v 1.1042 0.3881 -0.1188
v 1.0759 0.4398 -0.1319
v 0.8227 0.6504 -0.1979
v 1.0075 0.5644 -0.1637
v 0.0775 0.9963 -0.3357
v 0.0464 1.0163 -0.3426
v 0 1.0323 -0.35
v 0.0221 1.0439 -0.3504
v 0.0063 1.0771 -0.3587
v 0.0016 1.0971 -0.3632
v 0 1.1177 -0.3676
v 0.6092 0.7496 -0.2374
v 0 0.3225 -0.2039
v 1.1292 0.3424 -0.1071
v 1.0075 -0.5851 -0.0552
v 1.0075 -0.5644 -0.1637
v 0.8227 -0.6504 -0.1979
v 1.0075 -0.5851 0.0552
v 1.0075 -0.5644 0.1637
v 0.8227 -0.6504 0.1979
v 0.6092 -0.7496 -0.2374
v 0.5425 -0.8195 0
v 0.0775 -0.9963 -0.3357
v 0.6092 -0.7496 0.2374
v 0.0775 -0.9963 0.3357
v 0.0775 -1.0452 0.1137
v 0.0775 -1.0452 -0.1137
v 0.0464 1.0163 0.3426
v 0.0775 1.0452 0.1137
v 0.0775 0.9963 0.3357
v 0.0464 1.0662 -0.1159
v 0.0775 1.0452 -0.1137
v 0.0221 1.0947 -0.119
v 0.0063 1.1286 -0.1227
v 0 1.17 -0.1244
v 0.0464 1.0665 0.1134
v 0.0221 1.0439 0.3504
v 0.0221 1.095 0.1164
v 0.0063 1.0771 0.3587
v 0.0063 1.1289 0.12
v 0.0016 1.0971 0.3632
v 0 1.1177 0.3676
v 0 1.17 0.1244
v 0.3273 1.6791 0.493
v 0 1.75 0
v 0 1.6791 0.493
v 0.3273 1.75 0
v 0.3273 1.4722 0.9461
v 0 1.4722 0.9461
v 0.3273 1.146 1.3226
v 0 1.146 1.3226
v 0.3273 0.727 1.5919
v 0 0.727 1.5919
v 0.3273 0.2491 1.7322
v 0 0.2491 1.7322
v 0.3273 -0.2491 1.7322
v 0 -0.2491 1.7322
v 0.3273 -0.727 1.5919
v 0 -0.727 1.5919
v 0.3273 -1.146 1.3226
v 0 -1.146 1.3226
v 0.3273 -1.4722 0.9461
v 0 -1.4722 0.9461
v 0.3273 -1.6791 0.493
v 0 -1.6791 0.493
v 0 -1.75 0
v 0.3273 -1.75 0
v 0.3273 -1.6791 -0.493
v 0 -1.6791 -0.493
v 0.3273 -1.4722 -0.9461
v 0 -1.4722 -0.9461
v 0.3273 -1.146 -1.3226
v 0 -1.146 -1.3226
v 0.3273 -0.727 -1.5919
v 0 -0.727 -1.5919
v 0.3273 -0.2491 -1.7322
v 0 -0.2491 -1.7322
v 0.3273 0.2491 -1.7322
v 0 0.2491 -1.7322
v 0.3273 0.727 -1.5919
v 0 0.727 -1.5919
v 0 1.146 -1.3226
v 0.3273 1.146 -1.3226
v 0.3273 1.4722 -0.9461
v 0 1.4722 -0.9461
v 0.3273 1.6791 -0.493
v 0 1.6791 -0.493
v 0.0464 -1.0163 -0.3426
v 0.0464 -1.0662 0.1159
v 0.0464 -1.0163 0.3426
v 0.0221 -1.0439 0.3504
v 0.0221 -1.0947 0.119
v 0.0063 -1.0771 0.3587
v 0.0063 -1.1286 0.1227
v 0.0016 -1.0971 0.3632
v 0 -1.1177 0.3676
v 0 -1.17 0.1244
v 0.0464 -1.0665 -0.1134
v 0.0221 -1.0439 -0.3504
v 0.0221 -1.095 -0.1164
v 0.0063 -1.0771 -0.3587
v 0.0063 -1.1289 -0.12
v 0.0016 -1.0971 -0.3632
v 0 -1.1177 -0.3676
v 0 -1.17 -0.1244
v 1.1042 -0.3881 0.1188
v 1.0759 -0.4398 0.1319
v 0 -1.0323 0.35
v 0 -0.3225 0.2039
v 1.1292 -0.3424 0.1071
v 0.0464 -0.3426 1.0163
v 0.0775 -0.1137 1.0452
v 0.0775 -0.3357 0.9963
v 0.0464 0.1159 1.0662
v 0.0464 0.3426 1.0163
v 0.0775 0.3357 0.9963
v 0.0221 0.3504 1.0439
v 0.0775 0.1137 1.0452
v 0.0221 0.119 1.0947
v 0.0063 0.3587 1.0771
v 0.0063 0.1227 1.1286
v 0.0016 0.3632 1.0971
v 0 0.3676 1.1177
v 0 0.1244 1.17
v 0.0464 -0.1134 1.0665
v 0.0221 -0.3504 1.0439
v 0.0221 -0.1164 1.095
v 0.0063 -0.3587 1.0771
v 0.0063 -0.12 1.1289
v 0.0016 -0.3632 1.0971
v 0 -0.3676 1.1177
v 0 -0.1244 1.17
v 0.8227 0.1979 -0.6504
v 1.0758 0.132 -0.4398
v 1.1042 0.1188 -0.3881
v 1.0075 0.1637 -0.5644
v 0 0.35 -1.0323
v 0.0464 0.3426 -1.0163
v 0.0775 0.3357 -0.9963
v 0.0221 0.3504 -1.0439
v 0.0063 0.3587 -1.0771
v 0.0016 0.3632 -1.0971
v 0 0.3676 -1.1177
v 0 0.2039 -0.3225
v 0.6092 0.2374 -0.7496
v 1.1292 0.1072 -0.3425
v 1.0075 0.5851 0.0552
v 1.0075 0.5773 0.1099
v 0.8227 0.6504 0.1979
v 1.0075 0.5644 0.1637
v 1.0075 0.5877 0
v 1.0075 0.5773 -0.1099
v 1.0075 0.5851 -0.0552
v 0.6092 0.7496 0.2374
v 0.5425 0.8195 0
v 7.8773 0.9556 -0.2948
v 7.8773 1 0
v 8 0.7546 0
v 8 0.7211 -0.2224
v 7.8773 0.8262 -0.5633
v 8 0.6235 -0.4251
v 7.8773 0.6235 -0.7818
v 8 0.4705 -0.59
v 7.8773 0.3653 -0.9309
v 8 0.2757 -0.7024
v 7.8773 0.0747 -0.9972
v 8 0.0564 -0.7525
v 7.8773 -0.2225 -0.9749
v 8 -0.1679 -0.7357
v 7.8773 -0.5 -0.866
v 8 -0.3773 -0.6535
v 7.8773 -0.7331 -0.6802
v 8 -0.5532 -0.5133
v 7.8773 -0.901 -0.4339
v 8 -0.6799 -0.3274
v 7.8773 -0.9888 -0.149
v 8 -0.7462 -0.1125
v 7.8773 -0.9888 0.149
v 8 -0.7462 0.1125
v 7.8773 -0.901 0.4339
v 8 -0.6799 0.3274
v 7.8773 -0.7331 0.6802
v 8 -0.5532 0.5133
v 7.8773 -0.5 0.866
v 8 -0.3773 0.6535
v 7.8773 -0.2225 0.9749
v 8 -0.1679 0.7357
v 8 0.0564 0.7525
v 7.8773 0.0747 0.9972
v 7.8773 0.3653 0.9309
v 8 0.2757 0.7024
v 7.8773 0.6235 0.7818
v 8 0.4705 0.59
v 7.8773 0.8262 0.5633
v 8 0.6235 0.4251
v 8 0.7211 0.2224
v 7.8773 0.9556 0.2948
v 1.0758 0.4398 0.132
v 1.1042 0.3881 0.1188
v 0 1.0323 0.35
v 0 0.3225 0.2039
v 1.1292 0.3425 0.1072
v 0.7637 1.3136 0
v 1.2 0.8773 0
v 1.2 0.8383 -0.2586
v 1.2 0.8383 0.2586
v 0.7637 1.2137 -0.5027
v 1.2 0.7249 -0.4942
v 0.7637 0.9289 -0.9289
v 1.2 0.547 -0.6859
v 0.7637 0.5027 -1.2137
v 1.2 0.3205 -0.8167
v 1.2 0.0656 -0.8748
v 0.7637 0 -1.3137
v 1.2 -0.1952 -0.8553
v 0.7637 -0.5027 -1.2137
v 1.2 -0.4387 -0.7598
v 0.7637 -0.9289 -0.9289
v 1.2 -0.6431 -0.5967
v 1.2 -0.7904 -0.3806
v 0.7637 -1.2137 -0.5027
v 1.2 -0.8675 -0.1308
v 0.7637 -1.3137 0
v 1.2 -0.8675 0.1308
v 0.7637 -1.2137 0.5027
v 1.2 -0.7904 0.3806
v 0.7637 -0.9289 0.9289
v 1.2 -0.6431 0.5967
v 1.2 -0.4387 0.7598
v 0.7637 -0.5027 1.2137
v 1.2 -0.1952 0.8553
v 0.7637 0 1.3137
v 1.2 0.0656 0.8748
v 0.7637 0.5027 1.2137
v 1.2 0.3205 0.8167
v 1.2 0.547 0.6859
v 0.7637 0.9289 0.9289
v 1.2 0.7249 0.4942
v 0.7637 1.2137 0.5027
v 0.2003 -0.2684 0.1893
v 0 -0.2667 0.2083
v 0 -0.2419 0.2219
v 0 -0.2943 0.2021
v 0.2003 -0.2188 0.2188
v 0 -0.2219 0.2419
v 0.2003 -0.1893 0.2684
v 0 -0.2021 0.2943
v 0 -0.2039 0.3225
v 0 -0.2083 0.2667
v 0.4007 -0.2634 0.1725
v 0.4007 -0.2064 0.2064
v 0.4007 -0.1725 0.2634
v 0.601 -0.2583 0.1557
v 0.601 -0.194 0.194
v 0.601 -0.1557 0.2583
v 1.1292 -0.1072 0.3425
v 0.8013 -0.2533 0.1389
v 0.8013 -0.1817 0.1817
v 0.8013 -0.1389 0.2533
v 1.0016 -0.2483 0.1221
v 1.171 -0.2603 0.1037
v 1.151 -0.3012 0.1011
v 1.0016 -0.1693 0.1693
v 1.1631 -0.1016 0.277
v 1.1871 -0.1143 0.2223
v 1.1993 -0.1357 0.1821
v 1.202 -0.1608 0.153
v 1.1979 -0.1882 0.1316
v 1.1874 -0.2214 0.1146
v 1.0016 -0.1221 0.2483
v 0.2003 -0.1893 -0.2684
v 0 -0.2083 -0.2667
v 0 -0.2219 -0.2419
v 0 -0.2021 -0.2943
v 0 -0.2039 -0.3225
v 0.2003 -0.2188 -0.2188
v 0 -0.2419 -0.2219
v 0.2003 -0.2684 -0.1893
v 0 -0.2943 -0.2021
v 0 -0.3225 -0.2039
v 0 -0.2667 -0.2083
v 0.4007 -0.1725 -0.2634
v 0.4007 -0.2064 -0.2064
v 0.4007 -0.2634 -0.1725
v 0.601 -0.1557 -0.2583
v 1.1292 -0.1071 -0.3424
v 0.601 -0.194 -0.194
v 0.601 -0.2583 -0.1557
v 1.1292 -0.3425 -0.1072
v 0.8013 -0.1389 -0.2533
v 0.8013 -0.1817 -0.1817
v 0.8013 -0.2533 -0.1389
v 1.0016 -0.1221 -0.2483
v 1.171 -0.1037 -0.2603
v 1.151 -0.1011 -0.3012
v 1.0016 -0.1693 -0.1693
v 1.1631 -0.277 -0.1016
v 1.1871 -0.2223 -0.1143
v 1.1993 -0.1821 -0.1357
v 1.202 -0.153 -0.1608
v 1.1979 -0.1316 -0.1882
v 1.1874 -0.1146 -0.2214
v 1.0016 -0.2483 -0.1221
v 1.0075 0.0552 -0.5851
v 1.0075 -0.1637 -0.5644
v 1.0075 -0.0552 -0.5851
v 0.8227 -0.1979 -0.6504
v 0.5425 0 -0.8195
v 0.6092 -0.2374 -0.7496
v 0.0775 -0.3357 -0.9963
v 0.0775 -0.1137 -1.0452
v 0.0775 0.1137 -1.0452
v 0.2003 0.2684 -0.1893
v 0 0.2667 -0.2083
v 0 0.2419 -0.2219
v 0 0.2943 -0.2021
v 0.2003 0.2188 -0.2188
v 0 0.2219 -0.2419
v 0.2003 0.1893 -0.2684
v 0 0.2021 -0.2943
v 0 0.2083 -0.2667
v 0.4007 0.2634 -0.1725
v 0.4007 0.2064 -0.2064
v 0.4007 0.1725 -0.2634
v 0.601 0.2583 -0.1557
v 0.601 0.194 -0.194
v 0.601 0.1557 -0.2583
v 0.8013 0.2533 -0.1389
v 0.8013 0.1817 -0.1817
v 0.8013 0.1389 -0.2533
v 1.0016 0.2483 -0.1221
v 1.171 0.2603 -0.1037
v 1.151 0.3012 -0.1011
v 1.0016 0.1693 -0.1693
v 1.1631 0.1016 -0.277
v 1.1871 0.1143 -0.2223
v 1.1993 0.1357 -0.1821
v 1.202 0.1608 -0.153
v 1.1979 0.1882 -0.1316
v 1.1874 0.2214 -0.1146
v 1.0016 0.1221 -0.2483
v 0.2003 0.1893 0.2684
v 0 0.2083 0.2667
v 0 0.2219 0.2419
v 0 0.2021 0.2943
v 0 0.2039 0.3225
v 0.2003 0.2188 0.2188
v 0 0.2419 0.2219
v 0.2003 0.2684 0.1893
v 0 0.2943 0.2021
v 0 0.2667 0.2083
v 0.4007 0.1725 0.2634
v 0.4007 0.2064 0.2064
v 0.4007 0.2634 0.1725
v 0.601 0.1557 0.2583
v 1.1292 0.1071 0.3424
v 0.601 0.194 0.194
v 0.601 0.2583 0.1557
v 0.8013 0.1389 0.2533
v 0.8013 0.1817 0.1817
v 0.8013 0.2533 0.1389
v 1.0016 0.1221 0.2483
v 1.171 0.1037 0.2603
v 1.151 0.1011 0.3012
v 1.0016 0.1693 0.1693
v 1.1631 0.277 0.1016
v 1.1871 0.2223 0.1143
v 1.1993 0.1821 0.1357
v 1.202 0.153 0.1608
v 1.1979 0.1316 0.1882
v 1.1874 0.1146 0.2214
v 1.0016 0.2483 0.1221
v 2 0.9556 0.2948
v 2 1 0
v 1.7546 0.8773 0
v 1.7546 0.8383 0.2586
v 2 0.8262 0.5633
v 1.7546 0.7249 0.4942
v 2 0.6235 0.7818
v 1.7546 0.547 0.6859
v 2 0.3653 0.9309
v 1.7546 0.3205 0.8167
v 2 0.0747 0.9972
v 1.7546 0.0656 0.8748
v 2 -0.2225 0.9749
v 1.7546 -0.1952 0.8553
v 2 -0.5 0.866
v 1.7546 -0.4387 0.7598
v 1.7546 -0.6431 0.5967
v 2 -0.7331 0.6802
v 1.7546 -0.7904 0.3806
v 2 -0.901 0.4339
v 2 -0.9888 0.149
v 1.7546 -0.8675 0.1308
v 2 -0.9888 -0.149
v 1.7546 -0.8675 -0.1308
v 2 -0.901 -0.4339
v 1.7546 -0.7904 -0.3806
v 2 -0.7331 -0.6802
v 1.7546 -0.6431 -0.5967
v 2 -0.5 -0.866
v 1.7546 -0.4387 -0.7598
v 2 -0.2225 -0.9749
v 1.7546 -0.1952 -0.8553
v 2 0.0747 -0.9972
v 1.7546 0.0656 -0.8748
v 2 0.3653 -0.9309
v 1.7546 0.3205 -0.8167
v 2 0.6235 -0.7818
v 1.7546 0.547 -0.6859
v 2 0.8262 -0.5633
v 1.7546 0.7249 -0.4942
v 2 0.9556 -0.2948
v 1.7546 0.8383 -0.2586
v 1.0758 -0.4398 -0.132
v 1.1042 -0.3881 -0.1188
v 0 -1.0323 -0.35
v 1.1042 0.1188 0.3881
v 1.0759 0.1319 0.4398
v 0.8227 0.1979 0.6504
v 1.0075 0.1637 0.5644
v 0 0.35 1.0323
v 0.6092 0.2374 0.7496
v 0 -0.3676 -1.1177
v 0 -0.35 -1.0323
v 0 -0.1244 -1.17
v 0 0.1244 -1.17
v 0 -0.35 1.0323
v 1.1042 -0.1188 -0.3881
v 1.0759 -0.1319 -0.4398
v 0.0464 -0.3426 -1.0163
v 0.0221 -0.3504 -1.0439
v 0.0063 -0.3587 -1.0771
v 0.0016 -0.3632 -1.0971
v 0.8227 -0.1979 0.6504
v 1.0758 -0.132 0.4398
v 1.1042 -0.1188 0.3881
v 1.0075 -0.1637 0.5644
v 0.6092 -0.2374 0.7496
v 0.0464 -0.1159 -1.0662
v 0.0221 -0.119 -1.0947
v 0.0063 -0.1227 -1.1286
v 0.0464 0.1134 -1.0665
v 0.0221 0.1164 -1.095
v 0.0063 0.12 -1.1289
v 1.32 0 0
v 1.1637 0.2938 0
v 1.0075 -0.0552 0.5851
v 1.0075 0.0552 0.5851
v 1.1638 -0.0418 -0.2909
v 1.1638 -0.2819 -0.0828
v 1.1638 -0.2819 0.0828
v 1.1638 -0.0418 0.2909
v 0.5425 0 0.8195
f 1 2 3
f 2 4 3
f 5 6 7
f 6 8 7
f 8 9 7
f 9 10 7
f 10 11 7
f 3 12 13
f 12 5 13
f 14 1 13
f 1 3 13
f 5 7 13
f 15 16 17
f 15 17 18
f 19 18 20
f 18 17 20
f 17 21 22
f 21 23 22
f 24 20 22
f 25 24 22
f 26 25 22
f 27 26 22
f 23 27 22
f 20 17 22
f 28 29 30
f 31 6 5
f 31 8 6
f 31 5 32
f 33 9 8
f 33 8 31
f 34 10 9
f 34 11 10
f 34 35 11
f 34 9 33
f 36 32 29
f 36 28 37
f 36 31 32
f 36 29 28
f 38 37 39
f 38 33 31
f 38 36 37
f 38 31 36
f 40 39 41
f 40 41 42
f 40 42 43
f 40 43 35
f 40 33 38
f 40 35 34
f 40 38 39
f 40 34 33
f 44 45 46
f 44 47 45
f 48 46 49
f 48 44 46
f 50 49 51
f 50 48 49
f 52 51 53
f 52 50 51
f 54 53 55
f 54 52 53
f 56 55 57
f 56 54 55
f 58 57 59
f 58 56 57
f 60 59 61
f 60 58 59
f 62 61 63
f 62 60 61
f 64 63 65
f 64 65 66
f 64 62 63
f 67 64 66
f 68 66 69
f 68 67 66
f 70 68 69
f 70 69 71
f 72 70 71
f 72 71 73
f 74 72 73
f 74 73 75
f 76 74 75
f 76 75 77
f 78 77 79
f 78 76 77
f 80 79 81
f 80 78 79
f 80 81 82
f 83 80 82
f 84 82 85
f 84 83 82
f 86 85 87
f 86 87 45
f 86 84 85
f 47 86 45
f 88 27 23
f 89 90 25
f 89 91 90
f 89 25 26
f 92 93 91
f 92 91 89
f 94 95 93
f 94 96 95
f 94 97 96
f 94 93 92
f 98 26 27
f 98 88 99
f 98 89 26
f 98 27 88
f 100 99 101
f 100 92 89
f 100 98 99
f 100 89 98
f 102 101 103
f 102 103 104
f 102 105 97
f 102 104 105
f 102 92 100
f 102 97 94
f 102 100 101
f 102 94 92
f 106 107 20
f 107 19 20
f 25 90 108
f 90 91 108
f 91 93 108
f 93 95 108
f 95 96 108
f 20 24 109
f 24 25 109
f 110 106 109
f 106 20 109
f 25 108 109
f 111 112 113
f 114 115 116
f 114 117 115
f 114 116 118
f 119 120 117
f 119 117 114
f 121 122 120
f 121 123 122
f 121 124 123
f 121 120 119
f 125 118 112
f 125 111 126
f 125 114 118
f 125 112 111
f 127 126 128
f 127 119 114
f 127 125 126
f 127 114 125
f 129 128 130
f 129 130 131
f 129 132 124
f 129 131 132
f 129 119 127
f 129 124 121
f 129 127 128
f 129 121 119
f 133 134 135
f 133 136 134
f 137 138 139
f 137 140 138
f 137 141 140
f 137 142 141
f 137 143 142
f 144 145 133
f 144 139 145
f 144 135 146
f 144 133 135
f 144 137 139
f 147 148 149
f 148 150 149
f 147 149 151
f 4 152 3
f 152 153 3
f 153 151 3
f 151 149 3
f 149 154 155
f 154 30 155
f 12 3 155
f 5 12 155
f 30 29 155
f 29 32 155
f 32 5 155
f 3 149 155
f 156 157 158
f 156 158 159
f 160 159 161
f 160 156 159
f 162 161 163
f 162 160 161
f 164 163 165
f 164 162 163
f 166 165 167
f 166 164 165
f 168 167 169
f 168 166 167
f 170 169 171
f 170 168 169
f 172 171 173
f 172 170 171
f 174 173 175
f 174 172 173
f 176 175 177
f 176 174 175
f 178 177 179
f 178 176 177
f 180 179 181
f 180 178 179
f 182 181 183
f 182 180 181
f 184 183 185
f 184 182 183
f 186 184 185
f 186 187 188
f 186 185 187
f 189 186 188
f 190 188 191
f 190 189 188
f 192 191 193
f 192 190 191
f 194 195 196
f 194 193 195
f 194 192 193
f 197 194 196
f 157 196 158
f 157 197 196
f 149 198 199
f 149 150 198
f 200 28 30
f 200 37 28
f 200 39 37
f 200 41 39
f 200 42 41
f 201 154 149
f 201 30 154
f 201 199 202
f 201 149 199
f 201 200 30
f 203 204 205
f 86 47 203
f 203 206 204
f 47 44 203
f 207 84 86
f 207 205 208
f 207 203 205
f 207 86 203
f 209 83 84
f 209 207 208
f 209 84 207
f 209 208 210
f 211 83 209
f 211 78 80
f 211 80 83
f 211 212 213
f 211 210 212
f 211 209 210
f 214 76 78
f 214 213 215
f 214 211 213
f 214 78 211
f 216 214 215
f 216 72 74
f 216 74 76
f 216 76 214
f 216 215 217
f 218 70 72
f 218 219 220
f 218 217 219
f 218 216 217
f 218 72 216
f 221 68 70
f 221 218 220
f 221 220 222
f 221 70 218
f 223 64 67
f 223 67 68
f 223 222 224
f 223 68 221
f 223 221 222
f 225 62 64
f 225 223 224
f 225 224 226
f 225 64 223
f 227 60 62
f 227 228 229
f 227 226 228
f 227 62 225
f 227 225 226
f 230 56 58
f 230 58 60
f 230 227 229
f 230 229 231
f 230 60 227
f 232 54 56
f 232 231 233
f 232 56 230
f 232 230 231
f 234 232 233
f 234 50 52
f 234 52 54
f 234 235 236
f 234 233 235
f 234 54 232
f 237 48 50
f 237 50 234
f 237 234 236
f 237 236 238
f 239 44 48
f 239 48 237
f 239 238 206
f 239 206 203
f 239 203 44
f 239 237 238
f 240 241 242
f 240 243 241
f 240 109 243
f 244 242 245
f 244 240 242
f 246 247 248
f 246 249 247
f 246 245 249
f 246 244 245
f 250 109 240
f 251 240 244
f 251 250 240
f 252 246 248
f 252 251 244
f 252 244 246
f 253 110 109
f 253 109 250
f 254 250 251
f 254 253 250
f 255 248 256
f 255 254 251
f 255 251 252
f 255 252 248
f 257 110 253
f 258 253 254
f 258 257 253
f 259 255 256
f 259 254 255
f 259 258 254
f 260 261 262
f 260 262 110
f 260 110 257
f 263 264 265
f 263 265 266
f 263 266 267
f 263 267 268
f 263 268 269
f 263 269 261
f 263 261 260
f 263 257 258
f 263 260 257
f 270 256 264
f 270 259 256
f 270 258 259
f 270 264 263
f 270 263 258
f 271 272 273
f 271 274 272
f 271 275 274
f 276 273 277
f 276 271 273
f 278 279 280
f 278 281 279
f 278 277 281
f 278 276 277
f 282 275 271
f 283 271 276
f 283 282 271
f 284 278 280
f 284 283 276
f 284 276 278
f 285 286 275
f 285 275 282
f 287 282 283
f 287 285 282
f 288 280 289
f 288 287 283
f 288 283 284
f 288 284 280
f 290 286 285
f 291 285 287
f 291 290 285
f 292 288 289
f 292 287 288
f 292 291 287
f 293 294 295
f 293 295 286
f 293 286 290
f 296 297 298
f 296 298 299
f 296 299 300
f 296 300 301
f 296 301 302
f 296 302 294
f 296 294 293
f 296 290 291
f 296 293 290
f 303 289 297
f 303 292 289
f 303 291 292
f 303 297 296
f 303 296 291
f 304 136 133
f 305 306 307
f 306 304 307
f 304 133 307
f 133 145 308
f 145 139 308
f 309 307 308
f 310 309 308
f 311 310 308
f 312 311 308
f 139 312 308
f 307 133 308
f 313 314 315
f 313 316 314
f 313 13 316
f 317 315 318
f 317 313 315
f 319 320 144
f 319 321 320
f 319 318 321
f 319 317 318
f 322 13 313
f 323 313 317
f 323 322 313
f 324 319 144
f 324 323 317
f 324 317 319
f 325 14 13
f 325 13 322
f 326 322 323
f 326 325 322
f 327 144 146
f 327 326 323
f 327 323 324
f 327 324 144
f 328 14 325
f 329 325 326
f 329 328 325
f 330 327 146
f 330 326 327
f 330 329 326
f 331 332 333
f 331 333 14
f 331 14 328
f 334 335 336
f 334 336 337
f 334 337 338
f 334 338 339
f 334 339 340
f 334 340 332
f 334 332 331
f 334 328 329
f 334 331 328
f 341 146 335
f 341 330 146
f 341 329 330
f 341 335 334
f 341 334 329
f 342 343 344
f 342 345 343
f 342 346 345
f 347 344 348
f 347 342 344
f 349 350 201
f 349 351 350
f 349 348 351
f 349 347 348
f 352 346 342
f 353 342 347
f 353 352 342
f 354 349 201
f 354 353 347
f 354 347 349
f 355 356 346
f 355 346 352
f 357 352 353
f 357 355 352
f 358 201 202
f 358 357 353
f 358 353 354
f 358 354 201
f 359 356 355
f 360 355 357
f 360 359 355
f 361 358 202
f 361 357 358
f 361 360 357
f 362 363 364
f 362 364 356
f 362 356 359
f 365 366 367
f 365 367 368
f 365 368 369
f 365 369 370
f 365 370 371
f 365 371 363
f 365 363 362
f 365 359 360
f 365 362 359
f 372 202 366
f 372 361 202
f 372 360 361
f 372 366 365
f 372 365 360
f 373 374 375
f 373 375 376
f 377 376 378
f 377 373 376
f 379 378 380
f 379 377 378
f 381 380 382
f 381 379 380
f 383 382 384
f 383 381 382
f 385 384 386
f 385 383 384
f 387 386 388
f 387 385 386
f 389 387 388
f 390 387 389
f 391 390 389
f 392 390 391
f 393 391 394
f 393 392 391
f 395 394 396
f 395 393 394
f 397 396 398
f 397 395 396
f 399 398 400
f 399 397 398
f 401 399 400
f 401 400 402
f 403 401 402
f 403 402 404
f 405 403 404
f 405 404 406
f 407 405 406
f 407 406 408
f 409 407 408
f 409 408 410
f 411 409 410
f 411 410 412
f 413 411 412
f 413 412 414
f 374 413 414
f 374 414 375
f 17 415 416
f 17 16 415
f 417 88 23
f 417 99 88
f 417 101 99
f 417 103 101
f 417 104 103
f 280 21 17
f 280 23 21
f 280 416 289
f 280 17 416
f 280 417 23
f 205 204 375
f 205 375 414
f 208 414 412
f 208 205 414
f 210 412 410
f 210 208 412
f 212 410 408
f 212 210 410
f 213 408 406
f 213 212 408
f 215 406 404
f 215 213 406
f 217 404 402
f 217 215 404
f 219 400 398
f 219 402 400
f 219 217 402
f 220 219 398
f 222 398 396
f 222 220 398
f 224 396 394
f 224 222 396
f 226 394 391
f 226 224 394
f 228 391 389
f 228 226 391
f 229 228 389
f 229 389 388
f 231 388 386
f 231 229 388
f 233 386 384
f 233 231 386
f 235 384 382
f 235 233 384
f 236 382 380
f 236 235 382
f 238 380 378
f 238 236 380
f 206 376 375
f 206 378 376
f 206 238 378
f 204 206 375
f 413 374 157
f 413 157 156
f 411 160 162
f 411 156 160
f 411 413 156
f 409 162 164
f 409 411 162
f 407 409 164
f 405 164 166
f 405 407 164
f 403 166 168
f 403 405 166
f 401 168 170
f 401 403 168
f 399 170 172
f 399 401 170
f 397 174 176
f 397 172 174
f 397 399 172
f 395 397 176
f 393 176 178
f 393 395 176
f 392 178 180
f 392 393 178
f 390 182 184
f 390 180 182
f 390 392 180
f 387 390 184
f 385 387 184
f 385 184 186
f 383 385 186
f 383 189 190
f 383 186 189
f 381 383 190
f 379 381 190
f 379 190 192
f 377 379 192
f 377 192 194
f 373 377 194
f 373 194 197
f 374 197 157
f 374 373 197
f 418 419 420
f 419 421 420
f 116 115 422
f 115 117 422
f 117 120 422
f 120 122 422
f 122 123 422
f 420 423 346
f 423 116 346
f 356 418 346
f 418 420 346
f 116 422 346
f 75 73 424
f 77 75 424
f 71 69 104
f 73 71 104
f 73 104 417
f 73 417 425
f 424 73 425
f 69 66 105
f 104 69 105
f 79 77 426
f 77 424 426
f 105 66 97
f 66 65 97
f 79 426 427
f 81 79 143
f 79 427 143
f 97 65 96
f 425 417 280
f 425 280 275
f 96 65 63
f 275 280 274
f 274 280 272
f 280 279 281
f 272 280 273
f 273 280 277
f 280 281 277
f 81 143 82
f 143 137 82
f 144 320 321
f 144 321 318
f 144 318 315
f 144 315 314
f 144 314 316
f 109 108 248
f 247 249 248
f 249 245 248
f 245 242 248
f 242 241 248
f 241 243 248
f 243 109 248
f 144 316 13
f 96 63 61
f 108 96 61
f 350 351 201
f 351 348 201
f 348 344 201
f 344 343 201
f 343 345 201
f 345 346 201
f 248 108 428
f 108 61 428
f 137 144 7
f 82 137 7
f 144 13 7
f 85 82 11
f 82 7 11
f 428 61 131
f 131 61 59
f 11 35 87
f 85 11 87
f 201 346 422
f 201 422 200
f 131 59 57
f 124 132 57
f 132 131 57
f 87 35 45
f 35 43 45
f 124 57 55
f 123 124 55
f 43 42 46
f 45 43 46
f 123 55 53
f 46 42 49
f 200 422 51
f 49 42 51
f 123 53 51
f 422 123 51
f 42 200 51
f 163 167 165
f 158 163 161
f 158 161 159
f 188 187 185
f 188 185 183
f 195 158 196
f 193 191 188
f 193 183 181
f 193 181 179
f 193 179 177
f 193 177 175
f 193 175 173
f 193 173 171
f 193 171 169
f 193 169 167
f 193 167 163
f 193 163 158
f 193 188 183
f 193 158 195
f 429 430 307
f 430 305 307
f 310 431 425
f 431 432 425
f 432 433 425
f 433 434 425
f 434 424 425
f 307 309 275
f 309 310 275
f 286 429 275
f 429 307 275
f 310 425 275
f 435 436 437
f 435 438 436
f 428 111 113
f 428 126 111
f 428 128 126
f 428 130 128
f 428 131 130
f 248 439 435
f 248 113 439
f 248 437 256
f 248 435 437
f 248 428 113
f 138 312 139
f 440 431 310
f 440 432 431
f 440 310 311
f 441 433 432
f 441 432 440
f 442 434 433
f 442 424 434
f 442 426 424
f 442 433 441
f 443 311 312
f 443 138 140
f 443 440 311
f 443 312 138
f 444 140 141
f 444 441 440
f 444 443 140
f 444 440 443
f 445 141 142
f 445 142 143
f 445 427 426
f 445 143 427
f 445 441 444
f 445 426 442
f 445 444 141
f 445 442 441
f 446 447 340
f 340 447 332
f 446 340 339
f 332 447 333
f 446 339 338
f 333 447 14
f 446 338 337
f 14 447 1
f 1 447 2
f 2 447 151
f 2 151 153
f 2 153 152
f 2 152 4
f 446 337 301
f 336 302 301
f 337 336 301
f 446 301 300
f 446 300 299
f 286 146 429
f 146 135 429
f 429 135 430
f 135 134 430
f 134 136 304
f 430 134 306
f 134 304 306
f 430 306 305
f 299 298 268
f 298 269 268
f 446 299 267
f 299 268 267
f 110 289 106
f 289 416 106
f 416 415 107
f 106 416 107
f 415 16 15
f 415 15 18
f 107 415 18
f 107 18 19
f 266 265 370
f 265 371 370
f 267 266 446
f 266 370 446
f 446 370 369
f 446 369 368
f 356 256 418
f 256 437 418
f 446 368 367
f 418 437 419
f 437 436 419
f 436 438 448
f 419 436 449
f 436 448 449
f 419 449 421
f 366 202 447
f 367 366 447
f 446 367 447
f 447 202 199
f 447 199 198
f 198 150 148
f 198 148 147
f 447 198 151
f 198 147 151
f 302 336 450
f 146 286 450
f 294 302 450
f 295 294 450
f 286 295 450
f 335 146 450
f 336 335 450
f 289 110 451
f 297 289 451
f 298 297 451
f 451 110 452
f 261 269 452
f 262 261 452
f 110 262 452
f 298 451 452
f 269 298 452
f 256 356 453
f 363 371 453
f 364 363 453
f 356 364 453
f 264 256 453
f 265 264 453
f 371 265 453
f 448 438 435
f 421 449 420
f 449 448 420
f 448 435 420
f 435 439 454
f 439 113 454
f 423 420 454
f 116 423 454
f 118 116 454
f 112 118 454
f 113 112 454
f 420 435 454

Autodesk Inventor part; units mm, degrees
ref_plane "YZ Plane" through (0, 0, 0) normal (1, 0, 0) x (0, 1, 0)
ref_plane "XZ Plane" through (0, 0, 0) normal (0, 1, 0) x (-1, 0, 0)
sketch "Sketch1" plane through (0, 0, 0) normal (0, 0, 1) x (1, 0, 0)
  line L0 (1.32, 0) -> (8, 0)
  line L1 (8, 0) -> (8, 1)
  line L2 (8, 1) -> (2, 1)
  line L3 (2, 1) -> (1.7546, 0.8773)
  line L4 (1.7546, 0.8773) -> (1.2, 0.8773)
  line L5 (0, 1.75) -> (0, 1.09)
  line L6 (0, 1.09) -> (1.0075, 0.5877)
  line L7 (1.0075, 0.5877) -> (1.32, 0)
  line L8 (-1.6, 0) -> (9.6, 0) projected
  line L9 (0, -0.35) -> (0, 2.1) projected
  line L10 (0, 1.75) -> (0.3273, 1.75)
  line L11 (0.3273, 1.75) -> (1.2, 0.8773)
  line L12 (2, 1) -> (1.0773, 1) construction
  dimension "d1" = 6
  dimension "d2" = 2
  dimension "d3" = 1.7546
  dimension "d4" = 2.18
  dimension "d5" = 26.5
  dimension "d6" = 62
  dimension "d7" = 1.32
  dimension "d8" = 0.2454
  dimension "d12" = 3.5
  dimension "d13" = 45
  dimension "d15" = 8
  dimension "d24" = 1.2
revolve "Body" add sketch "Sketch1" angle 360 about axis through (1.32, 0, 0) along (1, 0, 0) contours L7 L6 L5 L10 L11 L4 L3 L2 L1 L0
sketch "Sketch2" plane through (0, 0, 0) normal (-1, 0, 0) x (0, 0, 1)
  line L0 (0, 1.09) -> (0, 0) construction
  line L1 (0, 0) -> (1.09, 0) construction
  arc A0 (0.327, 0) -> (0, 0.327) centre (0, 0) ccw construction
  arc A1 (0.3815, 0) -> (0, 0.3815) centre (0, 0) ccw construction
  arc A2 (1.0323, 0.35) -> (0.35, 1.0323) centre (0, 0) ccw
  line L2 (0, 0) -> (0.7707, 0.7707) construction
  line L3 (0.35, 1.0323) -> (0.2039, 0.3225)
  line L4 (1.0323, 0.35) -> (0.3225, 0.2039)
  arc A3 (0.35, 1.0323) -> (0, 1.09) centre (0, 0) ccw
  arc A4 (1.09, 0) -> (1.0323, 0.35) centre (0, 0) ccw
  line L5 (0, -2.45) -> (0, 2.45) projected
  line L6 (-2.45, 0) -> (2.45, 0) projected
  arc A5 (0.35, -1.0323) -> (1.0323, -0.35) centre (0, 0) ccw
  line L7 (0.35, -1.0323) -> (0.2039, -0.3225)
  line L8 (1.0323, -0.35) -> (0.3225, -0.2039)
  arc A6 (0, -1.09) -> (0.35, -1.0323) centre (0, 0) ccw
  arc A7 (1.0323, -0.35) -> (1.09, 0) centre (0, 0) ccw
  arc A8 (-0.35, 1.0323) -> (-1.0323, 0.35) centre (0, 0) ccw
  line L9 (-0.35, 1.0323) -> (-0.2039, 0.3225)
  line L10 (-1.0323, 0.35) -> (-0.3225, 0.2039)
  arc A9 (0, 1.09) -> (-0.35, 1.0323) centre (0, 0) ccw
  arc A10 (-1.0323, 0.35) -> (-1.09, 0) centre (0, 0) ccw
  arc A11 (-0.35, -1.0323) -> (0, -1.09) centre (0, 0) ccw
  arc A12 (-1.0323, -0.35) -> (-0.35, -1.0323) centre (0, 0) ccw
  arc A13 (-1.09, 0) -> (-1.0323, -0.35) centre (0, 0) ccw
  line L11 (-1.0323, -0.35) -> (-0.3225, -0.2039)
  line L12 (-0.35, -1.0323) -> (-0.2039, -0.3225)
  arc A14 (0.2039, 0.3225) -> (0.3225, 0.2039) centre (0.3022, 0.3022) ccw
  arc A15 (0.3225, -0.2039) -> (0.2039, -0.3225) centre (0.3022, -0.3022) ccw
  arc A16 (-0.3225, 0.2039) -> (-0.2039, 0.3225) centre (-0.3022, 0.3022) ccw
  arc A17 (-0.2039, -0.3225) -> (-0.3225, -0.2039) centre (-0.3022, -0.3022) ccw
  point P0 (0.7707, -0.7707)
  point P1 (-0.7707, 0.7707)
  point P2 (-0.7707, -0.7707)
  dimension "d17" = 0.654
  dimension "d18" = 0.763
  dimension "d19" = 2.18
  dimension "d20" = 45
  dimension "d21" = 0.35
extrude "Slot" add sketch "Sketch2" against normal up to next draft 5 contours L4 A14 L3 A2 | A5 L7 A15 L8 | L9 A16 L10 A8 | A12 L11 A17 L12
fillet "Fillet1" radius 0.14 4 edges at (0, 1.09, 0) (0, 0, -1.09) (0, -1.09, 0) (0, 0, 1.09)
thread "Thread" size "M2x0.4" class "6g" standard "ISO Metric profile" length 6
chamfer "Chamfer1" distance 0.2454 distance2 0.1227 1 edges at (8, -1, 0) measured on face at (8, -0.1182, -0.3117)
ref_plane "Work Plane2" through (3.35, 0, 0) normal (0, 0, -1) x (1, 0, 0)
equation "\"d1\" = GEL"
equation "\"d2\" = GD"
equation "\"d3\" = BDM"
equation "\"d4\" = SDM"
equation "\"d7\" = INTI"
equation "\"d8\" = GAL"
equation "\"d12\" = KOD"
equation "\"d13\" = 0.5 * SEWI"
equation "\"d15\" = NLG"
equation "\"d24\" = KOH"
equation "\"d17\" = 0.3 * SDM"
equation "\"d18\" = 0.35 * SDM"
equation "\"d19\" = SDM"
equation "\"d21\" = 0.5 * SBR"
equation "\"d23\" = 0.2 * SBR"
equation "\"d10\" = GEL"
equation "\"d25\" = -0.5 * SPD + 0.5 * GD"
equation "\"d26\" = 0.5 * GAL"
equation "\"NLG\" = 8"
equation "\"GEL\" = 6"
equation "\"GAL\" = 0.61345 * PTC"
equation "\"SPD\" = NND - 1.2269 * PTC"
equation "\"KOD\" = 3.5"
equation "\"KOH\" = 1.2"
equation "\"SBR\" = 0.7"
equation "\"INTI\" = 1.32"
equation "\"SDM\" = 2.18"
equation "\"GD\" = NND"
equation "\"BDM\" = NND - GAL"
equation "\"SEWI\" = 90deg"
equation "\"d9\" = SDM"
equation "\"GUL\" = 0.61345 * PTC"
equation "\"TOA\" = 30deg"
equation "\"EPV\" = 2.2"
equation "\"THREADDIA\" = 2"
equation "\"RR\" = 0.2"
equation "\"PTC\" = 0.4"
equation "\"NND\" = 2"
equation "\"GD1\" = THREADDIA - 1.2269 * PTC"
properties part number "AS 1427 - M2 x 8(5)" material "Steel, Mild"
